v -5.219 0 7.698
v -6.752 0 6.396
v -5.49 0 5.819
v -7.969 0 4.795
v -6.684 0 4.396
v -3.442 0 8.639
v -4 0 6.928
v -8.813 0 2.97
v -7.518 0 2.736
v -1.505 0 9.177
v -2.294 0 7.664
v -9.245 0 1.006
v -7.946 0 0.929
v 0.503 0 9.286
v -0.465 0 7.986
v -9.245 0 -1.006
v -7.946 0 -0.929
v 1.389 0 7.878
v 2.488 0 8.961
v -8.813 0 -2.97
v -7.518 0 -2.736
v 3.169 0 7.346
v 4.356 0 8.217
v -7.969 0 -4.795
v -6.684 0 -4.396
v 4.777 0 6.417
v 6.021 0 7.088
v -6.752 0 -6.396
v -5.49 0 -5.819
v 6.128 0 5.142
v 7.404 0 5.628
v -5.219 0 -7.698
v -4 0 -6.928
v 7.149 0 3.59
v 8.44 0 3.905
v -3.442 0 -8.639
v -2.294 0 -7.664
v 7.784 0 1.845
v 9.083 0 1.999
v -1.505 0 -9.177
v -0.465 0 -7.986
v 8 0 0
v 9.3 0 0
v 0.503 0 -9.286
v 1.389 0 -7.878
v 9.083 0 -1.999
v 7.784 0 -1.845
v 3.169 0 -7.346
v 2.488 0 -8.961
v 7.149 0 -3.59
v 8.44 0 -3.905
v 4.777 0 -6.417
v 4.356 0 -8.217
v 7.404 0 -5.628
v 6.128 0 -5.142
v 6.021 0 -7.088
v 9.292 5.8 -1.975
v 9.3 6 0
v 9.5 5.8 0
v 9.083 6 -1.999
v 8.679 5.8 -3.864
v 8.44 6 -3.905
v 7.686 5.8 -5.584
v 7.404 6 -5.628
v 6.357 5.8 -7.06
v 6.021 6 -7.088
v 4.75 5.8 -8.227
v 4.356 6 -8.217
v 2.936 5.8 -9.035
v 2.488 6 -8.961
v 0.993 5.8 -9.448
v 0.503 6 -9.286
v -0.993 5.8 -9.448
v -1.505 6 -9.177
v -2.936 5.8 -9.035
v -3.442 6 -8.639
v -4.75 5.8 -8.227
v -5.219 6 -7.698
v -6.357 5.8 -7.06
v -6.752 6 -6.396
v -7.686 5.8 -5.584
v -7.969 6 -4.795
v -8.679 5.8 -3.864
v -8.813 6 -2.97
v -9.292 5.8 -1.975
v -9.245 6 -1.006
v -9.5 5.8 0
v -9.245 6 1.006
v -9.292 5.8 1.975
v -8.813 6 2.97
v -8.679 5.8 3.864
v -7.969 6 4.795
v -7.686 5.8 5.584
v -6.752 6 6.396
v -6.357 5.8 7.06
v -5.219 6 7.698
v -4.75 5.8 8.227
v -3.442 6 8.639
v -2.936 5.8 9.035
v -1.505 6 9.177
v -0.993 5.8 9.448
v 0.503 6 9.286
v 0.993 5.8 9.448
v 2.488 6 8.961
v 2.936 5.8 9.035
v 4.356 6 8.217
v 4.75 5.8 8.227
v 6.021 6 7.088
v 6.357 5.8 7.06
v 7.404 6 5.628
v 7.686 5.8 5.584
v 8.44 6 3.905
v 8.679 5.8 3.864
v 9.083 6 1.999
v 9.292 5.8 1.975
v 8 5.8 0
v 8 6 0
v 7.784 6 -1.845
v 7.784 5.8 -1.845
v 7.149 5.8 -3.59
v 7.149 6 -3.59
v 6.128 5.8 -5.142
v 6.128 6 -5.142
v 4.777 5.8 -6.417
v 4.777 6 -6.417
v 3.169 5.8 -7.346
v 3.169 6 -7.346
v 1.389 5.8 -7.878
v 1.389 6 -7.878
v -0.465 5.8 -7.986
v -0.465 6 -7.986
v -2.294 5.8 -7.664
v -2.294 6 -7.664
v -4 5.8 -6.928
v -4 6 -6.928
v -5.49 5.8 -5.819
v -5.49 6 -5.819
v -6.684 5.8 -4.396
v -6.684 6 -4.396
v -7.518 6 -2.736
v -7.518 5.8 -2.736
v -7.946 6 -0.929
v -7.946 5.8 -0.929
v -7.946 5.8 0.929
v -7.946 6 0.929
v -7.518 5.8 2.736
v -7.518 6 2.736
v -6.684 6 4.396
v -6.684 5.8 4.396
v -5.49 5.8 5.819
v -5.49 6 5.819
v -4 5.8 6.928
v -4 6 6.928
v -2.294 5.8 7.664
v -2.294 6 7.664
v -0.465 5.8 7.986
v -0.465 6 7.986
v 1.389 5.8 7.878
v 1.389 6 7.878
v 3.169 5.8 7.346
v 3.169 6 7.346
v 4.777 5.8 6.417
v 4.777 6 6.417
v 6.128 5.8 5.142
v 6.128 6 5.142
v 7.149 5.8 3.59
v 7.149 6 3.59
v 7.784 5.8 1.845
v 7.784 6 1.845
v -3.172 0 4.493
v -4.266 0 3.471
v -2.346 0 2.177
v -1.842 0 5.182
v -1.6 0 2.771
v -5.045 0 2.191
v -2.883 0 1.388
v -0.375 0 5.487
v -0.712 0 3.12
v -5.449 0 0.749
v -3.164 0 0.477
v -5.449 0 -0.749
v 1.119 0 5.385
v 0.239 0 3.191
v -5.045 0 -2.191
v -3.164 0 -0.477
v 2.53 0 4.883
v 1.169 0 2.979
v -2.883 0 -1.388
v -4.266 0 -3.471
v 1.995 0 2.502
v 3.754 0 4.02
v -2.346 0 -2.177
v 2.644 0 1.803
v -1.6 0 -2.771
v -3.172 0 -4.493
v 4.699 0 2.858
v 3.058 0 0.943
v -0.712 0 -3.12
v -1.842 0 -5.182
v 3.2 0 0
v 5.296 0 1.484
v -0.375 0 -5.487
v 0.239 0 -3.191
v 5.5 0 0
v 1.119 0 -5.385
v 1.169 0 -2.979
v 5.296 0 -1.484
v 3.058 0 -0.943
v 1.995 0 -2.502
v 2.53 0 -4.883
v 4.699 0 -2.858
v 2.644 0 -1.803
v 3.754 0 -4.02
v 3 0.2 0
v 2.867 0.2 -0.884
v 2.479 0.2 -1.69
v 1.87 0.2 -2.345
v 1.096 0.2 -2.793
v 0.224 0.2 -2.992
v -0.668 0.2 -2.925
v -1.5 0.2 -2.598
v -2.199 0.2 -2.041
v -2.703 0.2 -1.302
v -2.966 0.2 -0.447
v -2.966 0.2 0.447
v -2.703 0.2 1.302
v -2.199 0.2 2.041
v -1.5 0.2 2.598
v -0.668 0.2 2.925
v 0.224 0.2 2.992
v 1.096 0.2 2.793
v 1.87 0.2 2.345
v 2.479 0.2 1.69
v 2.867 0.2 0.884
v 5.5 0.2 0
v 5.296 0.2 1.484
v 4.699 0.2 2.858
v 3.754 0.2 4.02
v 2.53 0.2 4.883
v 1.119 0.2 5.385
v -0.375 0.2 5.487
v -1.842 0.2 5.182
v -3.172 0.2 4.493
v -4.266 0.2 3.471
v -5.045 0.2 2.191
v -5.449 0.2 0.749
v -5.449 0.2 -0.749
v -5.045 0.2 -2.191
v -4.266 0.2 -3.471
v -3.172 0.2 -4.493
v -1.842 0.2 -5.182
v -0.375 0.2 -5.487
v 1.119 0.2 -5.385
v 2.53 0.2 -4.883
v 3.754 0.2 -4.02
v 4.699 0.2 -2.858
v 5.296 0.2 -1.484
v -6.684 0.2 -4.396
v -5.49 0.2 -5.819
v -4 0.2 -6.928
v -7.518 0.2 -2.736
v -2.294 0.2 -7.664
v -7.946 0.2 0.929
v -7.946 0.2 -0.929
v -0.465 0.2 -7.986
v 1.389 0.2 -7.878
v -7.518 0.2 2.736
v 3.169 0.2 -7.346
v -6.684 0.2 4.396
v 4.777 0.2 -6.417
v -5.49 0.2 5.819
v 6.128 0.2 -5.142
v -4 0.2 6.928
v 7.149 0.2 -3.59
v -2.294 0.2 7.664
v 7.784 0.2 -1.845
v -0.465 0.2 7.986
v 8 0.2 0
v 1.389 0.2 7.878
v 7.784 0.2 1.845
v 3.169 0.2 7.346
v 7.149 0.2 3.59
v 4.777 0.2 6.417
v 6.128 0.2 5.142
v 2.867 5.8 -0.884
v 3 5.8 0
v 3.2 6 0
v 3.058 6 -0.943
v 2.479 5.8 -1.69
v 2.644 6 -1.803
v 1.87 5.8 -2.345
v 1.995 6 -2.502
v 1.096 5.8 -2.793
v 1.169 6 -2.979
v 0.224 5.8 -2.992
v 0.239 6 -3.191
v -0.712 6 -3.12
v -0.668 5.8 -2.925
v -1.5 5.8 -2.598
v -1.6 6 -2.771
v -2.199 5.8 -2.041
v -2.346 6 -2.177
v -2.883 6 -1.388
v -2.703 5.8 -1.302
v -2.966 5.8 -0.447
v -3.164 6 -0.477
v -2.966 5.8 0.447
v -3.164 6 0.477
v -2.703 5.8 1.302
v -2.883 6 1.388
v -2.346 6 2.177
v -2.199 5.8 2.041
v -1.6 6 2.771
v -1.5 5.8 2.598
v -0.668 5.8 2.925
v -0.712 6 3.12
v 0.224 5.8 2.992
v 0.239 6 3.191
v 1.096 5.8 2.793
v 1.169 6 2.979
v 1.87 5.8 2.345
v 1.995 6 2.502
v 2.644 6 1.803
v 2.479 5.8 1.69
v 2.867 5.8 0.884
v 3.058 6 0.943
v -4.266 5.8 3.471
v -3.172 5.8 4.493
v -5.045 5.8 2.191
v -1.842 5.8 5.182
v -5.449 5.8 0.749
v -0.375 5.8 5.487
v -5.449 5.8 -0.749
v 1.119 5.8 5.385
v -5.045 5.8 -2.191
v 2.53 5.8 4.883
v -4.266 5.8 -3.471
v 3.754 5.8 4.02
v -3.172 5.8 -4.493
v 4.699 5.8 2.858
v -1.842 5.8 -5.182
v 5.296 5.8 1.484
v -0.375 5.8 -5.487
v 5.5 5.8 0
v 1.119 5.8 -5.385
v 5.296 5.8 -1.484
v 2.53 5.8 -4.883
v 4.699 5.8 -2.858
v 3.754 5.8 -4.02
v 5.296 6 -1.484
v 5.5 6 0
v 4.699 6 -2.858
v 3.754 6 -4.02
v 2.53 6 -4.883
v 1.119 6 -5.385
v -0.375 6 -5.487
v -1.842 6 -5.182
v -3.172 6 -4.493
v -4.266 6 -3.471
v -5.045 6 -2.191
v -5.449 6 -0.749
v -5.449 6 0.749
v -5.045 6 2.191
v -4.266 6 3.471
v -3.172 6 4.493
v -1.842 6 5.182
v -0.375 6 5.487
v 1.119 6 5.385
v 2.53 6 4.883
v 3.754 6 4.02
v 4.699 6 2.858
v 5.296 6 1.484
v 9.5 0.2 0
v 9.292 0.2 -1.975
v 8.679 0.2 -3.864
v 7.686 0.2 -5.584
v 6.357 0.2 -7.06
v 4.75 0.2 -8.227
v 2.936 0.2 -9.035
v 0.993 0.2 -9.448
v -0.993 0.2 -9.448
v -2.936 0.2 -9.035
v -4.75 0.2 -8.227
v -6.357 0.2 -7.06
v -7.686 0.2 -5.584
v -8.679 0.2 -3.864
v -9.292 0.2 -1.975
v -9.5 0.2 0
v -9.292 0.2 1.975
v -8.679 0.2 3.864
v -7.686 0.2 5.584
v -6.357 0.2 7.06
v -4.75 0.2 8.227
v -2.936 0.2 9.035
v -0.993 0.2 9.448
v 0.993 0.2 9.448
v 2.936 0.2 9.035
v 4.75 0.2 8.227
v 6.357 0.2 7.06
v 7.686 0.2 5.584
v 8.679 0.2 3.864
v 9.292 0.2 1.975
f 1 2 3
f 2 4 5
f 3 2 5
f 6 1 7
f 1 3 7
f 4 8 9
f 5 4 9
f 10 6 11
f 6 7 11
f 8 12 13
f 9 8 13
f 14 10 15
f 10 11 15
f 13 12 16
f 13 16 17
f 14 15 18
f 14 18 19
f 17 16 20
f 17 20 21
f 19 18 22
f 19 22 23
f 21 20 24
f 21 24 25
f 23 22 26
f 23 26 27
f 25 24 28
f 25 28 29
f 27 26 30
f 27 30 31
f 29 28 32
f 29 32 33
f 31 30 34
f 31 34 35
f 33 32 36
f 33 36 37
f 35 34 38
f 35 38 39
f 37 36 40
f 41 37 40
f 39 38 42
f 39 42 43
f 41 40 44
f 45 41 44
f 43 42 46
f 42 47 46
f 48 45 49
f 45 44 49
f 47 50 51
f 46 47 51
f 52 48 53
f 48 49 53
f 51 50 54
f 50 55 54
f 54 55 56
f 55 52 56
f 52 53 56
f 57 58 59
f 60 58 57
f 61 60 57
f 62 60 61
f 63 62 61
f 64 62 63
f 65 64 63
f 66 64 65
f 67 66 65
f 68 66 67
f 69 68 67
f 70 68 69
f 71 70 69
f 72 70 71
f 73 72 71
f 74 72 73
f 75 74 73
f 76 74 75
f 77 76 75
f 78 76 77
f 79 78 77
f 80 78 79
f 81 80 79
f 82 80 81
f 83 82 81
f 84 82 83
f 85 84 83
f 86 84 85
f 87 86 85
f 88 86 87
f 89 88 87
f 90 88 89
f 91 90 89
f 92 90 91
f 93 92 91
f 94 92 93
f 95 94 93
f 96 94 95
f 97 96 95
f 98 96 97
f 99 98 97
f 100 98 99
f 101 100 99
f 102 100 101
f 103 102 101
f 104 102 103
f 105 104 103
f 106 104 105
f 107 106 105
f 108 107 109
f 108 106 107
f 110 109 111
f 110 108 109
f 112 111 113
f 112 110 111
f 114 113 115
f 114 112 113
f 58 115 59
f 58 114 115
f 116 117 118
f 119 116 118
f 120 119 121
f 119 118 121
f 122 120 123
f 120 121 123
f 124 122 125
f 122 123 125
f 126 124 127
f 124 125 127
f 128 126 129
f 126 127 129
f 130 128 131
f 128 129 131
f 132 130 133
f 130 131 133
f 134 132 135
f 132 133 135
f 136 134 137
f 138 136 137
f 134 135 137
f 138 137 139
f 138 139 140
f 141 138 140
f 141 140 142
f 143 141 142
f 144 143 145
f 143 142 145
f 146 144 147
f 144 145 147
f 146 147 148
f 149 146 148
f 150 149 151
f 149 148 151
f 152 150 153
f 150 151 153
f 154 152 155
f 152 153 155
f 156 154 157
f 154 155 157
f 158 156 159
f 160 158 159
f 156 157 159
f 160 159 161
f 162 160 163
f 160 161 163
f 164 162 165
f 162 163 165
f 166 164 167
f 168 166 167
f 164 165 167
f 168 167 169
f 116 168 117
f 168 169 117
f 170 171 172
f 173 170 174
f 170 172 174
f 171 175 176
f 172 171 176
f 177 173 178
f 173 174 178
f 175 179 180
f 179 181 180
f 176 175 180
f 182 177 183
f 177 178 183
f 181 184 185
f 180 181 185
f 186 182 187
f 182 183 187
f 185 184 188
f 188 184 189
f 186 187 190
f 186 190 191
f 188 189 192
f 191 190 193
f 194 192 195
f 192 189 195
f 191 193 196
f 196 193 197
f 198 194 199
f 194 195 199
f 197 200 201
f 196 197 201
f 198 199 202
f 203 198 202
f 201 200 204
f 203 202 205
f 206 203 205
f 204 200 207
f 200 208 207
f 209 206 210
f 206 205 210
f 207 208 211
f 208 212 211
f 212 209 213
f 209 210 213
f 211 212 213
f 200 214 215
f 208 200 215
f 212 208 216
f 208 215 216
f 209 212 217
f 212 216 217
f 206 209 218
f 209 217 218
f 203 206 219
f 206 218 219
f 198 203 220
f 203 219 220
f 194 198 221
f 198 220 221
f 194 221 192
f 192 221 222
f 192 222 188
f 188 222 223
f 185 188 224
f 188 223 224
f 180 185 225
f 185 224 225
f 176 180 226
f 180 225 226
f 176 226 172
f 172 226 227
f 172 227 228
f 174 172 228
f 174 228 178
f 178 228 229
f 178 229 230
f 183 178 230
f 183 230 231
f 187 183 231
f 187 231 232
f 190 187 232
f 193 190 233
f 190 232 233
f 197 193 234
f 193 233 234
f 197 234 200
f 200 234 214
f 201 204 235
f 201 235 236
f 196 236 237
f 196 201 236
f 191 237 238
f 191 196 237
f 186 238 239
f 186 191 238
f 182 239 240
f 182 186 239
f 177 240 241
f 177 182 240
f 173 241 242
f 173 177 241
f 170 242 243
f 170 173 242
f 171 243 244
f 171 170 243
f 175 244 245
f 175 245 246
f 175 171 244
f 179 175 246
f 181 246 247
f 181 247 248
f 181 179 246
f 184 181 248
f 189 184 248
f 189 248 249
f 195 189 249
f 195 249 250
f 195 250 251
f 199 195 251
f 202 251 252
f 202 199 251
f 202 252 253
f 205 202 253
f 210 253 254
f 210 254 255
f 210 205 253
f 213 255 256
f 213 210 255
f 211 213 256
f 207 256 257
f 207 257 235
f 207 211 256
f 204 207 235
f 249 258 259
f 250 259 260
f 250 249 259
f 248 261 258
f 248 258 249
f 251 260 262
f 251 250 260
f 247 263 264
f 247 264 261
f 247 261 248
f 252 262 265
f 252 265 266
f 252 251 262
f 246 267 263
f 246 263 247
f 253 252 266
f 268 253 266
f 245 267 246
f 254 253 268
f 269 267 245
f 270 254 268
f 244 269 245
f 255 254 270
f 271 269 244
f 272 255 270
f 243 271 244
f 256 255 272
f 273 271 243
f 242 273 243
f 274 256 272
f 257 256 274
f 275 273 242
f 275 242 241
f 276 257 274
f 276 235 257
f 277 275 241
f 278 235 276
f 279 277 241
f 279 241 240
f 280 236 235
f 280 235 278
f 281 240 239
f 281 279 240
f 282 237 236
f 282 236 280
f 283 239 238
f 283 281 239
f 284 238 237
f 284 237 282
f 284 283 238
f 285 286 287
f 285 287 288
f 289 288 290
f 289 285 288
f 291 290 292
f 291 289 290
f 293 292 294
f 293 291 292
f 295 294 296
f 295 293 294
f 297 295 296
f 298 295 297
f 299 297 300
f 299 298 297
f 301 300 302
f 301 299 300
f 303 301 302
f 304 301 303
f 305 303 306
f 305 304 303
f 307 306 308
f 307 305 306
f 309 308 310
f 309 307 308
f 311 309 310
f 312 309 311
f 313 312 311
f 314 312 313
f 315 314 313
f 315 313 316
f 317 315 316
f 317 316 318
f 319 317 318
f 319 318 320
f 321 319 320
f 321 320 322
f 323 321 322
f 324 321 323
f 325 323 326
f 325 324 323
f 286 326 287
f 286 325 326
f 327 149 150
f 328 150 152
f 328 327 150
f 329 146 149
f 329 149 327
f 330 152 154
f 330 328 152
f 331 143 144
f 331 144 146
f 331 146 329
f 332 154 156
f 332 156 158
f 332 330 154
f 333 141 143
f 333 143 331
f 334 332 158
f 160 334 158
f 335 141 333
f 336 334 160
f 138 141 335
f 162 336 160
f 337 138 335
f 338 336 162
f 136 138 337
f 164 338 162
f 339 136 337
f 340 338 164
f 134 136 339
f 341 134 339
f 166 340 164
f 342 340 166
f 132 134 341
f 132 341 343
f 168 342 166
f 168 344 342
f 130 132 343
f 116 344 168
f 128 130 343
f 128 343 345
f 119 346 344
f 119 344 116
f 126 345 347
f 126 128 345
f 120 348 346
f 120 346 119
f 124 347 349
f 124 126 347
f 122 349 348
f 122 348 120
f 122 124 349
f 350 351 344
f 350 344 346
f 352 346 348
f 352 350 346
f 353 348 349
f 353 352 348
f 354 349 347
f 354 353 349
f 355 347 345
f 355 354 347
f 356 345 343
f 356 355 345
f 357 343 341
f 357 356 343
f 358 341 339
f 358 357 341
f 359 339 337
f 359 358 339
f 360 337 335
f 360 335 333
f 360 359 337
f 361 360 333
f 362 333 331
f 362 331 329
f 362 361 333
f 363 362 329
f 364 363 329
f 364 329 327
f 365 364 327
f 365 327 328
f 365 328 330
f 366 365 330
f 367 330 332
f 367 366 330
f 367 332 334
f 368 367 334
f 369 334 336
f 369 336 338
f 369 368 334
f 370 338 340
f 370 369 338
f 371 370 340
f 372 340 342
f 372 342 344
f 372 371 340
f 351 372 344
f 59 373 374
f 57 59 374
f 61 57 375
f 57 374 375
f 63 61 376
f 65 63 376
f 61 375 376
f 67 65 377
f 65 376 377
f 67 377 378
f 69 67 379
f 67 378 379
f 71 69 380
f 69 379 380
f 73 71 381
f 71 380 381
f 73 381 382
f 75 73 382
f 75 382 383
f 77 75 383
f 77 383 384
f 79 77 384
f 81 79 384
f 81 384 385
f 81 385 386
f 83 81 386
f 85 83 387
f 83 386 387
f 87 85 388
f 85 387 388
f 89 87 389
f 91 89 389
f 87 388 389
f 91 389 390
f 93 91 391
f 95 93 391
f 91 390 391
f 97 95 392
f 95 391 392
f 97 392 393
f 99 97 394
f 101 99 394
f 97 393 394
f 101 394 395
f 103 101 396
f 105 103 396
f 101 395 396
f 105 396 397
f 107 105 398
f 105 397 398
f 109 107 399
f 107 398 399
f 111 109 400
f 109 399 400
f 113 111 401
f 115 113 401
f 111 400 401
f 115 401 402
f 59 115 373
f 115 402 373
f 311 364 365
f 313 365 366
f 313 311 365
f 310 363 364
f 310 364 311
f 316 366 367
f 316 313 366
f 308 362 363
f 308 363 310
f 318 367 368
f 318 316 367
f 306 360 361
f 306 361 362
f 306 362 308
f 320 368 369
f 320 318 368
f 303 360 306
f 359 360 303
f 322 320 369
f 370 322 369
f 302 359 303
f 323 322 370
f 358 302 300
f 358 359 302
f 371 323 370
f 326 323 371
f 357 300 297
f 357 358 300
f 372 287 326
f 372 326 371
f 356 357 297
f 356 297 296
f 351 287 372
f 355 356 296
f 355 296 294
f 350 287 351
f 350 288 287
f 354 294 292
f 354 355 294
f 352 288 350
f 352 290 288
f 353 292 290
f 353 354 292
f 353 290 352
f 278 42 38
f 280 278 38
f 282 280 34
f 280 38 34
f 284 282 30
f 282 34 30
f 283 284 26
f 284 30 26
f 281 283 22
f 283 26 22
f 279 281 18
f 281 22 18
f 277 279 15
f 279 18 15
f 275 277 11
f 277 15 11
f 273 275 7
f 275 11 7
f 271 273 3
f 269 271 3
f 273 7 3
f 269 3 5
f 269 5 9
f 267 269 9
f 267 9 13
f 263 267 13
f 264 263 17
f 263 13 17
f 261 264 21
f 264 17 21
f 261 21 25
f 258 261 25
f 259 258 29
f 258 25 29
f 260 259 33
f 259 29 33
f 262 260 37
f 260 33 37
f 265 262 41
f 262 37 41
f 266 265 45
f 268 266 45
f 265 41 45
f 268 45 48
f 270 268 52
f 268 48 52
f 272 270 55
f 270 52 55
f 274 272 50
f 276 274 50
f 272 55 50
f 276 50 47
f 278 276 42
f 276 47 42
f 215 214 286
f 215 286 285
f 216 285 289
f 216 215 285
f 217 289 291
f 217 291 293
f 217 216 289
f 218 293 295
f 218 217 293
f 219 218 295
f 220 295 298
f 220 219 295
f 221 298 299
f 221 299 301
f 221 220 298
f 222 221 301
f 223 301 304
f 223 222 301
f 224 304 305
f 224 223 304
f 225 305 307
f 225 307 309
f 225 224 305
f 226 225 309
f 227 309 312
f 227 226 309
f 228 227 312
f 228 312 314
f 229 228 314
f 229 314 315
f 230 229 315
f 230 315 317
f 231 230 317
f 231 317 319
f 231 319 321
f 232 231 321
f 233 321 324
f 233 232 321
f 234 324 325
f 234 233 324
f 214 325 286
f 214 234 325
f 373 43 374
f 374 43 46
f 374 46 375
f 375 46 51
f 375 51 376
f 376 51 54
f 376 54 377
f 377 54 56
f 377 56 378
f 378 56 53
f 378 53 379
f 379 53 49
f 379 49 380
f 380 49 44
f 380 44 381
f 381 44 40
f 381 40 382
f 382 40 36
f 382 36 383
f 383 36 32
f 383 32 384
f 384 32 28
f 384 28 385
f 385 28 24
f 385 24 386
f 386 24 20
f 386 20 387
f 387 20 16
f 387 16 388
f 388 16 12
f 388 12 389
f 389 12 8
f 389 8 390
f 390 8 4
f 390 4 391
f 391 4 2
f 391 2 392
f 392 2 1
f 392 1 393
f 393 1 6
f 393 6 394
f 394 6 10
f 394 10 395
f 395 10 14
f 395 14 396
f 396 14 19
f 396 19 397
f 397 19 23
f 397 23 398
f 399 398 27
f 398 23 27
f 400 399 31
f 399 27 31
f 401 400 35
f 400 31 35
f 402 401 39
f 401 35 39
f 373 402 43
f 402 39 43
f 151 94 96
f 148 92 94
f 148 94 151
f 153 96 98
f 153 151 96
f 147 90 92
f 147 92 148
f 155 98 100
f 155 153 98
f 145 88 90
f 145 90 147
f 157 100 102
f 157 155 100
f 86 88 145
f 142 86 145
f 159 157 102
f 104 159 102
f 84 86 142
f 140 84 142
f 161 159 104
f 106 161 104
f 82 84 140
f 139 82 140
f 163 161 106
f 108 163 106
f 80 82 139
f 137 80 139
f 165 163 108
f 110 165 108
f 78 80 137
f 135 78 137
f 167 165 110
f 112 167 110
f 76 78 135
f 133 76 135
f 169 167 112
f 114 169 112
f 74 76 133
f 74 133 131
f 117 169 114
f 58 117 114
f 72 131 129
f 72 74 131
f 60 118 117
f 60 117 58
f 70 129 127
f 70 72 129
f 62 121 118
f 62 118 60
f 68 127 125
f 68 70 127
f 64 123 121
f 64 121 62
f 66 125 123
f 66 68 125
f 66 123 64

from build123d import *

# Parameters (mm, degrees)
SKETCH1_R           = 9.5
SKETCH1_R_2         = 3
BOSS_EXTRUDE1_DEPTH = 6
SKETCH2_R           = 8
SKETCH2_R_2         = 5.5
CUT_EXTRUDE1_DEPTH  = 0.2
SKETCH3_R           = 8
SKETCH3_R_2         = 5.5
CUT_EXTRUDE2_DEPTH  = 0.2
CHAMFER1_SIZE       = 0.2


with BuildPart() as part:
    # Sketch1 → Boss-Extrude1 (new body)
    with BuildSketch(Plane(origin=(0, 0, 0), x_dir=(1, 0, 0), z_dir=(0, 1, 0))):
        Circle(SKETCH1_R)
        Circle(SKETCH1_R_2, mode=Mode.SUBTRACT)
    extrude(amount=BOSS_EXTRUDE1_DEPTH)

    # Sketch2 → Cut-Extrude1 (cut)
    with BuildSketch(Plane(origin=(0, 6, 0), x_dir=(1, 0, 0), z_dir=(0, 1, 0))):
        Circle(SKETCH2_R)
        Circle(SKETCH2_R_2, mode=Mode.SUBTRACT)
    extrude(amount=-CUT_EXTRUDE1_DEPTH, mode=Mode.SUBTRACT)

    # Sketch3 → Cut-Extrude2 (cut)
    with BuildSketch(Plane.XZ):
        Circle(SKETCH3_R)
        Circle(SKETCH3_R_2, mode=Mode.SUBTRACT)
    extrude(amount=-CUT_EXTRUDE2_DEPTH, mode=Mode.SUBTRACT)

    # Chamfer1
    chamfer1_edges = [part.edges().sort_by_distance(p)[0] for p in [
        (-9.5, 0, 0),
        (-9.5, 6, 0),
        (-3, 0, 0),
        (-3, 6, 0),
    ]]
    chamfer(chamfer1_edges, length=CHAMFER1_SIZE)


solid = part.part
